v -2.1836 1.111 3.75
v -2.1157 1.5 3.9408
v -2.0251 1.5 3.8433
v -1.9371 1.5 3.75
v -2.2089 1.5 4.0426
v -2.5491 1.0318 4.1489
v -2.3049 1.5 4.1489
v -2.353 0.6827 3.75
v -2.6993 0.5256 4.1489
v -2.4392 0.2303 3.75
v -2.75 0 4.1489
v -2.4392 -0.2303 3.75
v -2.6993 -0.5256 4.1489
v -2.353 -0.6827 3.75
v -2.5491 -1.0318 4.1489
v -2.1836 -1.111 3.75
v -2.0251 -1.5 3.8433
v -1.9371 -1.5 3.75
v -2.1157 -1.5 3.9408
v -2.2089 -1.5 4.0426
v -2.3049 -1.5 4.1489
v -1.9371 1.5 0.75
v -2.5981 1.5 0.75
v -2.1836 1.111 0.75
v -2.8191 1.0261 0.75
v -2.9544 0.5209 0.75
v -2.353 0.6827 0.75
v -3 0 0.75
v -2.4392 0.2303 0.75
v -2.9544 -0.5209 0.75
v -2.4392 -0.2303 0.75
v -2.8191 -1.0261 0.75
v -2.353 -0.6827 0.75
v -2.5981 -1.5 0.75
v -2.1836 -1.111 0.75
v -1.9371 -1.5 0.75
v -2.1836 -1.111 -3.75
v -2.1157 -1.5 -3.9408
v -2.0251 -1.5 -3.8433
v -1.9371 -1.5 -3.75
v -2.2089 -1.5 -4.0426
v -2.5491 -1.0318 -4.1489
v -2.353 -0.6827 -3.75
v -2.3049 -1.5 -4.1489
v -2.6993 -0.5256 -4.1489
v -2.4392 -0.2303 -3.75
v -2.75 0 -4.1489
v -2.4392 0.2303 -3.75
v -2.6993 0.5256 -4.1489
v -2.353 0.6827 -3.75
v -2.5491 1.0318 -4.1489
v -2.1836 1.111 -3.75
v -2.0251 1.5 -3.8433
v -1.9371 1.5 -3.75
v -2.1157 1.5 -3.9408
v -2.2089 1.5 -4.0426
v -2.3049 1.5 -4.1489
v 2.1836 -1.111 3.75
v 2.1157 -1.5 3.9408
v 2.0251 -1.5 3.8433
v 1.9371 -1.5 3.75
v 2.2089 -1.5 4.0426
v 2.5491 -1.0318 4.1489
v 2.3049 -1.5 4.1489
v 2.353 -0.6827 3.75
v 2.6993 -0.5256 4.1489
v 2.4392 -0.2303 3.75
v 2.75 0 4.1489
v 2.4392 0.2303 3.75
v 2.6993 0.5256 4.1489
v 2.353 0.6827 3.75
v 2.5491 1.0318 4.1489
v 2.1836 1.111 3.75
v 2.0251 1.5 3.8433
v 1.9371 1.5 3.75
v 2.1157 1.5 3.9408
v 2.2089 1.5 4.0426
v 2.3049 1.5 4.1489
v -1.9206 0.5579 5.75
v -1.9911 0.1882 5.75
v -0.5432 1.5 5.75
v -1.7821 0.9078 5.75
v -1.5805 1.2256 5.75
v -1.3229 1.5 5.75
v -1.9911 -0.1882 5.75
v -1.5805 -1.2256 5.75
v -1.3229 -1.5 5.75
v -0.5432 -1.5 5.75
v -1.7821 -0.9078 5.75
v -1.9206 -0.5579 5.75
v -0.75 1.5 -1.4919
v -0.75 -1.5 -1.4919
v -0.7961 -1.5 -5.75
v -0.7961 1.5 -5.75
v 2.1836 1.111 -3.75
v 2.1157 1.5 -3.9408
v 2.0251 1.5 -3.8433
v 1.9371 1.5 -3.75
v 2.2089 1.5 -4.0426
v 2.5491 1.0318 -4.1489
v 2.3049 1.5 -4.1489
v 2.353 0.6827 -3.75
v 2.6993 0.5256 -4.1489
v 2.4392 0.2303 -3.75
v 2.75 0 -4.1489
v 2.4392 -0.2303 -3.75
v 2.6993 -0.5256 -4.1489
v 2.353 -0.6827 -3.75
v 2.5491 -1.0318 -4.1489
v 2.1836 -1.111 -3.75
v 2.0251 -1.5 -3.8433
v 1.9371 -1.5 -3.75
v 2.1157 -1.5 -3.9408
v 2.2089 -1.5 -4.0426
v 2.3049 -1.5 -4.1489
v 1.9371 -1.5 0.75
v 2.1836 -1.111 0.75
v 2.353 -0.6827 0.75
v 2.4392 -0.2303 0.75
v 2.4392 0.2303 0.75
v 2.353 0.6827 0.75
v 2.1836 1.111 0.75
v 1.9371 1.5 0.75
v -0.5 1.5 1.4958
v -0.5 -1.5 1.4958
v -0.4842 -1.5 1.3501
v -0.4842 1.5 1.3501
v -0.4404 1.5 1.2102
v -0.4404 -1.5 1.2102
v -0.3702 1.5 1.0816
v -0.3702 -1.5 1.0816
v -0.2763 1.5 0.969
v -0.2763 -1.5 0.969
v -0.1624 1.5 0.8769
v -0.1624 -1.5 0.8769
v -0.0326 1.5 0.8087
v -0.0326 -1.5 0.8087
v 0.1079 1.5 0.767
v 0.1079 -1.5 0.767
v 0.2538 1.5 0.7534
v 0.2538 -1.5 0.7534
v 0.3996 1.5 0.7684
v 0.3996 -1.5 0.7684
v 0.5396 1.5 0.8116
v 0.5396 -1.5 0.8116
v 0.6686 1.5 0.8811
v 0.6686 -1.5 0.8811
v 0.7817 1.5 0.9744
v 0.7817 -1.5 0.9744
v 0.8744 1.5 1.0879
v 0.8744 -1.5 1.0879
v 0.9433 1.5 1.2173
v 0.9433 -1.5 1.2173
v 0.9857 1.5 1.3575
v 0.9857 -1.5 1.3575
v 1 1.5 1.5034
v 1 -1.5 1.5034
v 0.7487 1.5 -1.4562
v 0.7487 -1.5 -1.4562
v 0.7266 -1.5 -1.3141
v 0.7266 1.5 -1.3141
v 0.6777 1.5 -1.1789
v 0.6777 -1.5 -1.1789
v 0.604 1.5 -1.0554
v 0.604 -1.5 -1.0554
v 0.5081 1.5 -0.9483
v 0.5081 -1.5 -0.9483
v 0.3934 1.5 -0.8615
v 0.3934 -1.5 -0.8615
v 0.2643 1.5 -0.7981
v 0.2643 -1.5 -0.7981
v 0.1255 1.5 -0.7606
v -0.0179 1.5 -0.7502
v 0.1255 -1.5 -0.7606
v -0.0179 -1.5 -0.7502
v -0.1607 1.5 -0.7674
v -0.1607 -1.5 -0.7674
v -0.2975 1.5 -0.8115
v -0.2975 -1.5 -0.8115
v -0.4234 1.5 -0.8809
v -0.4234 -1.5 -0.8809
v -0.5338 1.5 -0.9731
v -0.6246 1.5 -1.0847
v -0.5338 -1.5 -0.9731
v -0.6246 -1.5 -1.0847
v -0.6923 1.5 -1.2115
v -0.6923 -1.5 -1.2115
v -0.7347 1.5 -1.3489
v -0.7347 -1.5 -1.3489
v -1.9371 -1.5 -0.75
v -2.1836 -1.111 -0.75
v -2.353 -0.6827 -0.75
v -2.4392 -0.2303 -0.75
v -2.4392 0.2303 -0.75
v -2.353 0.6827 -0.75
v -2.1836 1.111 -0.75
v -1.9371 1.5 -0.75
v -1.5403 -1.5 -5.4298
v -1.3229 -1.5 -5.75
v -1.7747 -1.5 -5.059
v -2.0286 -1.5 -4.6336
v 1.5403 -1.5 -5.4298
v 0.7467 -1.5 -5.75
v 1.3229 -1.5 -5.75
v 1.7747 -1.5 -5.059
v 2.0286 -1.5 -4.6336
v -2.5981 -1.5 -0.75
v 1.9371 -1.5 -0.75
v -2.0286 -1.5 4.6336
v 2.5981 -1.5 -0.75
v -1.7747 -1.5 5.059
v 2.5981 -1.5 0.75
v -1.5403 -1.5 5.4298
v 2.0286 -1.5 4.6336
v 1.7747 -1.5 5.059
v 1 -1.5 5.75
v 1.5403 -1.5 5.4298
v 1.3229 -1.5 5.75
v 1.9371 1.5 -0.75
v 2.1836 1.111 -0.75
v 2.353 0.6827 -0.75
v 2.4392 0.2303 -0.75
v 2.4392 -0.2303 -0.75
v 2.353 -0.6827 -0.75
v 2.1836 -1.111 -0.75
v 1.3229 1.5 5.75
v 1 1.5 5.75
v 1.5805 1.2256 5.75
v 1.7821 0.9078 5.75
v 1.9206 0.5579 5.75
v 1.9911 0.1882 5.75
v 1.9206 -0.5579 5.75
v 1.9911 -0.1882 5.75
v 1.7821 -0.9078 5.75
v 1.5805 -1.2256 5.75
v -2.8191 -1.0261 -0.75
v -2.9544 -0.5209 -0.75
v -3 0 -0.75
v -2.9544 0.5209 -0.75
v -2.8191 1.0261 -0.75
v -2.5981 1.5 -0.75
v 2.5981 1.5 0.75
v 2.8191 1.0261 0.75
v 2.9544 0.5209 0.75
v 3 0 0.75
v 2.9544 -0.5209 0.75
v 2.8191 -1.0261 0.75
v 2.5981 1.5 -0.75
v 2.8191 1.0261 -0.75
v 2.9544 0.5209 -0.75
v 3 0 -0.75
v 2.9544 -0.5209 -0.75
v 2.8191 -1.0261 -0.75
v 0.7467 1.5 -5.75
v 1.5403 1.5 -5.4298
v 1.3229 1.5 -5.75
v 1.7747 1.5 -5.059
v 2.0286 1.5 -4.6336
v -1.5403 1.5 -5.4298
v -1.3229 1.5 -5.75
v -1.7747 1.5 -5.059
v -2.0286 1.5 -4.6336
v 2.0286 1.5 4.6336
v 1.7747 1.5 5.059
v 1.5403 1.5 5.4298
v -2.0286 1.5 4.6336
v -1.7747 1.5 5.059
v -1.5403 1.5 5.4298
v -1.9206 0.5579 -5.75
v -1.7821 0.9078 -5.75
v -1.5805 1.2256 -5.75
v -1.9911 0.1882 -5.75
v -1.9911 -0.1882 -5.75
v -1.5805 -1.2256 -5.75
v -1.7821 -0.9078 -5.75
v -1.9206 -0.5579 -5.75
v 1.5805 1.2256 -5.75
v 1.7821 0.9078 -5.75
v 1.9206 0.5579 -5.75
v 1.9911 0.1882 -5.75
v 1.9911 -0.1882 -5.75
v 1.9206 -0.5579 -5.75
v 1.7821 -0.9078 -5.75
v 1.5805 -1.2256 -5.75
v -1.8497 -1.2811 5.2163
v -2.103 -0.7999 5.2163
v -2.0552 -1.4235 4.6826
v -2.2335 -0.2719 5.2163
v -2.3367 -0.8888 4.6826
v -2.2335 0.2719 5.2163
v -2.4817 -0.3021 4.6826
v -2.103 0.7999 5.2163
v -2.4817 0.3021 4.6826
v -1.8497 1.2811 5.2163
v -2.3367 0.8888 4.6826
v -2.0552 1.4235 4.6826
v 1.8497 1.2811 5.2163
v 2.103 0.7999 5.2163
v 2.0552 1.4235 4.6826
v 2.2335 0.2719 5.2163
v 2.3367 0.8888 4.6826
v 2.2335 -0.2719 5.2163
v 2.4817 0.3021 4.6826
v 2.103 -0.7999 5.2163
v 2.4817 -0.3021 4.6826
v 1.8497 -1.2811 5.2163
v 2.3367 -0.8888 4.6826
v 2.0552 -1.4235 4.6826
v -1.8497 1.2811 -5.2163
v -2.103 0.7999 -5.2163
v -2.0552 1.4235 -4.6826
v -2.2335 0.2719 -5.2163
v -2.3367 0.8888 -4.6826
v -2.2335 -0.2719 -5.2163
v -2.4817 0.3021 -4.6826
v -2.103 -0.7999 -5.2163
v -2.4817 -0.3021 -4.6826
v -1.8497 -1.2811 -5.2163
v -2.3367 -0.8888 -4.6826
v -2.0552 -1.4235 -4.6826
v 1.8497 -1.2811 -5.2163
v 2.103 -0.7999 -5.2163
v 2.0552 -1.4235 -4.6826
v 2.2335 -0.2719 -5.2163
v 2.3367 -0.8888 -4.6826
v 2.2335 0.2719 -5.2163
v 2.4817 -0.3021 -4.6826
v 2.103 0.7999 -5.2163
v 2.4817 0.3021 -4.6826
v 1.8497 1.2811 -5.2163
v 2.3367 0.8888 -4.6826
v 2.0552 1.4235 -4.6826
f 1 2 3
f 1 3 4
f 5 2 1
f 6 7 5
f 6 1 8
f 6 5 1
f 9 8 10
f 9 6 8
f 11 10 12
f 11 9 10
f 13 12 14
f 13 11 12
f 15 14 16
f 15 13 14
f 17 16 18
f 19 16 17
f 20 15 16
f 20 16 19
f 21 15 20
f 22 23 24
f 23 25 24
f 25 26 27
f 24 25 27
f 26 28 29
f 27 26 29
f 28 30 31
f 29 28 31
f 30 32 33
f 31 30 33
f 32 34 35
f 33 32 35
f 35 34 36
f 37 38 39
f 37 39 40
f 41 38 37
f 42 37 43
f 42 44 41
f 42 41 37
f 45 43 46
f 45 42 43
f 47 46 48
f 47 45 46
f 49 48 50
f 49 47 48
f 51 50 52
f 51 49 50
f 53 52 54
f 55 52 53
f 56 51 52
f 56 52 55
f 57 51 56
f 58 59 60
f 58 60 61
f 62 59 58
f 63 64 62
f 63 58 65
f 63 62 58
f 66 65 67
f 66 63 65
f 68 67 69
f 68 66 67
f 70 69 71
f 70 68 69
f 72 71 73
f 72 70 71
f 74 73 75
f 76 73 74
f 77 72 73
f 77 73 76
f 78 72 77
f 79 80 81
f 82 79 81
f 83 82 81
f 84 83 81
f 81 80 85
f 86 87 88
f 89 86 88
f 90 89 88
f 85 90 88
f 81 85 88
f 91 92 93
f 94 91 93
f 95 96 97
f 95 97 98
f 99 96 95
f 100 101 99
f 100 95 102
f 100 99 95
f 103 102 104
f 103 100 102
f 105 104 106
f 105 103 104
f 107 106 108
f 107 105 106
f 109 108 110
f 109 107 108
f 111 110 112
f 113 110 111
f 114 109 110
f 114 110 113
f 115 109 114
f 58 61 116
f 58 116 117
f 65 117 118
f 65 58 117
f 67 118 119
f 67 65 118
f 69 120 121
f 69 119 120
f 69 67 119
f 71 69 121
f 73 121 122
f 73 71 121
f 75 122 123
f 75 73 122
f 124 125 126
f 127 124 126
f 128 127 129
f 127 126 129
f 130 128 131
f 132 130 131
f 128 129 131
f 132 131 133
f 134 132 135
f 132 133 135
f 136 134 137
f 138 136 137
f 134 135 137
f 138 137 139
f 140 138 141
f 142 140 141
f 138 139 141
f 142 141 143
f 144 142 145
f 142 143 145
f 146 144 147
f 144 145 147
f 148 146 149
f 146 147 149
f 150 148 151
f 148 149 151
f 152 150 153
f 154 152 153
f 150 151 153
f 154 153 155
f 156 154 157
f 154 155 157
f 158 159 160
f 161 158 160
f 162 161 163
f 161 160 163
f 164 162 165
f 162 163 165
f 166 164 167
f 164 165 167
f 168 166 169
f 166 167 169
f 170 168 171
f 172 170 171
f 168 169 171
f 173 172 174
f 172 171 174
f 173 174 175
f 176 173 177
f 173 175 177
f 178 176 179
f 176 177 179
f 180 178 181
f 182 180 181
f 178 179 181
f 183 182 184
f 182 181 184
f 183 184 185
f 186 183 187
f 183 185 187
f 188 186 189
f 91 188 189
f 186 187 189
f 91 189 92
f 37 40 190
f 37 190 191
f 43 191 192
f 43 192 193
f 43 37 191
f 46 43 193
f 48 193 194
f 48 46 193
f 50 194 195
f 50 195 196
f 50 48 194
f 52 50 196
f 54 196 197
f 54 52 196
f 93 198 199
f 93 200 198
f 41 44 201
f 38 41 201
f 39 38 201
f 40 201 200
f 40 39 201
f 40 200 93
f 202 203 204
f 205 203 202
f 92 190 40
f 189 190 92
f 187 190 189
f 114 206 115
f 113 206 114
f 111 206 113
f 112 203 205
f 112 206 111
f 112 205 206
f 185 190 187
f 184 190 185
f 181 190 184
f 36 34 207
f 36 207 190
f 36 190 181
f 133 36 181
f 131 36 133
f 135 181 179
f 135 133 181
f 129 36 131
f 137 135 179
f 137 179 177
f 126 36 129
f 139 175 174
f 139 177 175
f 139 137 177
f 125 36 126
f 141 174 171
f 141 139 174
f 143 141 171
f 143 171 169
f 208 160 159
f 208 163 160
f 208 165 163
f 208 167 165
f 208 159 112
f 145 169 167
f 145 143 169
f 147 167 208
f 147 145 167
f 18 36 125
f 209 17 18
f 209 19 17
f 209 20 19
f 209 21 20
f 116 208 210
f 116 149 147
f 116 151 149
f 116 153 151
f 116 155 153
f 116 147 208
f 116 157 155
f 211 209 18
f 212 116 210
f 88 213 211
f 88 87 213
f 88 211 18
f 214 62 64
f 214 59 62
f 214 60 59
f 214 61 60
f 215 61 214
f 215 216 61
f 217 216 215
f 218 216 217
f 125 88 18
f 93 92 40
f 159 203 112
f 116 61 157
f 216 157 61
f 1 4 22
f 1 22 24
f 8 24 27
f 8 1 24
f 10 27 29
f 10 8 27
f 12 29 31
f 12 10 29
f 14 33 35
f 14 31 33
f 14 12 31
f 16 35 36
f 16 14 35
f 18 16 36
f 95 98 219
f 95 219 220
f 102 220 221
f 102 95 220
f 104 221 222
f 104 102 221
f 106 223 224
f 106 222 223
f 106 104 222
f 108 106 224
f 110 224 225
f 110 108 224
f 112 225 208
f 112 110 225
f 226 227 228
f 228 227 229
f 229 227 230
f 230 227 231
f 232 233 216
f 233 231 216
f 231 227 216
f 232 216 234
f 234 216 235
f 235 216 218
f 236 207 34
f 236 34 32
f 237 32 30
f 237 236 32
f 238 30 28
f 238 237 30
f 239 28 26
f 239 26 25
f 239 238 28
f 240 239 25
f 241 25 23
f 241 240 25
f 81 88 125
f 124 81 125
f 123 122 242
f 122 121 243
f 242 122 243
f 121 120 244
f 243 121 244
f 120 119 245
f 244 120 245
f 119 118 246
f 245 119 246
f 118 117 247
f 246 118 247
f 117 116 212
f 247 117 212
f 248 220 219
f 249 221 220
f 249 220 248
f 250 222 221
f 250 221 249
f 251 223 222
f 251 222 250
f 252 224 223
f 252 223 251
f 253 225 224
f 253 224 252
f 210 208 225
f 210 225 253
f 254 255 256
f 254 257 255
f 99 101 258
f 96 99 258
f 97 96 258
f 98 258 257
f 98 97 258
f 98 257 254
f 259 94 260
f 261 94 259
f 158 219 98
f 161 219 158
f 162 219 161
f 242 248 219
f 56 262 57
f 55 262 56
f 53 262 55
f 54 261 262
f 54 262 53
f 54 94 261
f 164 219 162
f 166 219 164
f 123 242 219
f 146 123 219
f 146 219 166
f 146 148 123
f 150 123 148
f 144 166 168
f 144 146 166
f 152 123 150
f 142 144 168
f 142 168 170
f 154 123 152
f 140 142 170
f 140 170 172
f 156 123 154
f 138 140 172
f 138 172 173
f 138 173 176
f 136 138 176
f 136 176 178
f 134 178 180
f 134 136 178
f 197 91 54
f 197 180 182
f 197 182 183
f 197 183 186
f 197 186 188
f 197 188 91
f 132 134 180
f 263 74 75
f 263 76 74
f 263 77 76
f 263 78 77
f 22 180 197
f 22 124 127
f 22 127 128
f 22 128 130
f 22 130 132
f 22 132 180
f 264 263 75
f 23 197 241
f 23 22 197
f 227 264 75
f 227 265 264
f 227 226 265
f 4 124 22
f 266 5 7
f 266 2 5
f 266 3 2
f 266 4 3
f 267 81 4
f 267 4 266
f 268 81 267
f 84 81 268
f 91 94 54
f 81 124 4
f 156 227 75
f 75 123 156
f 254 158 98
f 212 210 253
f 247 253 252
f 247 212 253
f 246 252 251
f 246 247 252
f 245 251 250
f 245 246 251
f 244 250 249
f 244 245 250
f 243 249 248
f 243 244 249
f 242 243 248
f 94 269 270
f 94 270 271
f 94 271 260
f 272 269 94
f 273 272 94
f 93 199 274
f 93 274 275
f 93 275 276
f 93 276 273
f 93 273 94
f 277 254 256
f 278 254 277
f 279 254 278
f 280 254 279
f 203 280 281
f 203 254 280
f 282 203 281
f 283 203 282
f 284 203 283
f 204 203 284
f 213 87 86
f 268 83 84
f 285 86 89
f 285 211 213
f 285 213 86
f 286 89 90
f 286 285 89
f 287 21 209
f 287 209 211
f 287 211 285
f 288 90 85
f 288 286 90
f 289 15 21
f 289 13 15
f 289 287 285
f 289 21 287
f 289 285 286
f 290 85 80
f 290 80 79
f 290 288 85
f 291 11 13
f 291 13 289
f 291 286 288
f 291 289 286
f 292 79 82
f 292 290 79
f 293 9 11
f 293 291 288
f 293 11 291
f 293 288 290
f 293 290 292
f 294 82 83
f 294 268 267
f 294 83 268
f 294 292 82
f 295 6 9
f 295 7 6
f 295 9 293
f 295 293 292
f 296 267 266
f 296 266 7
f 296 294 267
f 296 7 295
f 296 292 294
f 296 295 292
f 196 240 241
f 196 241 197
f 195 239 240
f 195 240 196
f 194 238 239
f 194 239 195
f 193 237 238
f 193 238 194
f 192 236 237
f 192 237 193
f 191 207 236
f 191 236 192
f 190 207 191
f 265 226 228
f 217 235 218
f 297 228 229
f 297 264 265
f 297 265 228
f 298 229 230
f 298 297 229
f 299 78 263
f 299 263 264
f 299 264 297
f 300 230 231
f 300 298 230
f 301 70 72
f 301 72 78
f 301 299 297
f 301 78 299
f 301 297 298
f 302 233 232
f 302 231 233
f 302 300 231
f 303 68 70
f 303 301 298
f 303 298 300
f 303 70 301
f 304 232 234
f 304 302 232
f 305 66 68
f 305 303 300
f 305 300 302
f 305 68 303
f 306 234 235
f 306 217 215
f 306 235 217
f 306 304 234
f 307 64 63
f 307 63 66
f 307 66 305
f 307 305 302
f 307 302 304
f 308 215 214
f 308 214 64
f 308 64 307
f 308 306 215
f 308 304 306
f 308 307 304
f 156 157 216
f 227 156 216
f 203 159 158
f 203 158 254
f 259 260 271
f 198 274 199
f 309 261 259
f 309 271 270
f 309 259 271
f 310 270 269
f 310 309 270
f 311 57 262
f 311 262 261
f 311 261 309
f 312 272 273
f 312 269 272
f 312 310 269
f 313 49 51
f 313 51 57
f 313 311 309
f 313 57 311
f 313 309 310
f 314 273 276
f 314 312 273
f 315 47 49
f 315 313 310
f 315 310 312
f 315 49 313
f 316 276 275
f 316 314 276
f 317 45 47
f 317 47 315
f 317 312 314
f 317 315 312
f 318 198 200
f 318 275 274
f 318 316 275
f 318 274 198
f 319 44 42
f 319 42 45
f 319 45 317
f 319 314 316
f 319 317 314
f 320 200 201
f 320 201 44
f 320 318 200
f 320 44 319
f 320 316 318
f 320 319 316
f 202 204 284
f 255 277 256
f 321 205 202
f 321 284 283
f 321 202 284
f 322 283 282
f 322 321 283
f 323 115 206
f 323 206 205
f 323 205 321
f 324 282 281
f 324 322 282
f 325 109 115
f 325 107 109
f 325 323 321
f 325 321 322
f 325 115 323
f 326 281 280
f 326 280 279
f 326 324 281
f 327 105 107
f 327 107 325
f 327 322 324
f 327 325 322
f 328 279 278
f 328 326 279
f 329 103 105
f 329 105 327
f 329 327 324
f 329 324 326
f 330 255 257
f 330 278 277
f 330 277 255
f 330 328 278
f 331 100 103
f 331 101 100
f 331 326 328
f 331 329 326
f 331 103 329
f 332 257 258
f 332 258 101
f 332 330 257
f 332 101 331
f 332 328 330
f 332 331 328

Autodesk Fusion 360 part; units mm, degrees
sketch "Sketch1" plane through (0, 0, 0) normal (0, 1, 0) x (1, 0, 0)
  line L0 (3, 0) -> (3, -0.75)
  line L1 (3, -0.75) -> (2.45, -0.75)
  line L2 (2.45, -0.75) -> (2.45, -3.75)
  line L3 (2.45, -3.75) -> (2.75, -4.1489)
  line L4 (2.75, -4.1489) -> (2, -5.75)
  line L5 (2, -5.75) -> (0, -5.75)
  line L6 (3, 0) -> (0, 0) construction
  line L7 (2.75, 4.1489) -> (2, 5.75)
  line L8 (3, 0) -> (3, 0.75)
  line L9 (2.45, 0.75) -> (2.45, 3.75)
  line L10 (2.45, 3.75) -> (2.75, 4.1489)
  line L11 (2, 5.75) -> (0, 5.75)
  line L12 (0, 0) -> (0, 6.5) construction
  line L13 (3, 0.75) -> (2.45, 0.75)
  line L14 (0, -5.75) -> (0, 5.75)
  dimension "d1" = 3
  dimension "d2" = 0.75
  dimension "d3" = 3
  dimension "d4" = 5
  dimension "d6" = 2
  dimension "d7" = 2.75
  dimension "d8" = 2.45
  dimension "d9" = 2
revolve "Revolve2" add sketch "Sketch1" angle 360 about axis through (0, 0, 5.75) along (0, 0, -1)
sketch "Sketch3" plane through (0, 0, 5.75) normal (0, 0, 1) x (-1, 0, 0)
  circle A0 centre (0, 0) radius 2
  line L0 (-5, -1.5) -> (5, -1.5)
  line L1 (5, -1.5) -> (5, 1.5)
  line L2 (5, 1.5) -> (-5, 1.5)
  line L3 (-5, 1.5) -> (-5, -1.5)
  line L4 (-5, -1.5) -> (5, 1.5) construction
  line L5 (5, -1.5) -> (-5, 1.5) construction
  line L6 (5.6117, 3.0022) -> (-6, 3.0022)
  line L7 (-6, 3.0022) -> (-6, -3)
  line L8 (-6, -3) -> (5.6117, -3)
  line L9 (5.6117, -3) -> (5.6117, 3.0022)
  circle A1 centre (0, 0) radius 2
  dimension "d12" = 10
  dimension "d13" = 3
extrude "Extrude3" cut sketch "Sketch3" against normal blind 14 contours A0 L2 A1 | A0 L0 A1 | L6 L7 L8 L9
sketch "Sketch4" plane through (0, -1.5, 0) normal (0, -1, 0) x (1, 0, 0)
  spline S0 degree 2 poles (-2.3049, 4.1489) (-1.7364, 5.1662) (-1.3229, 5.75) knots 0 0 0 0.187886 0.187886 0.187886 weights 1 1.022081 1
  spline S1 degree 2 poles (-1.9371, 3.75) (-2.1104, 3.9322) (-2.3049, 4.1489) knots 0 0 0 0.054258 0.054258 0.054258 weights 1 1.00251 1
  line L0 (-1.9371, 3.75) -> (-1.9371, 0.75)
  line L1 (-1.9371, 0.75) -> (-2.5981, 0.75)
  line L2 (-2.5981, 0.75) -> (-2.5981, -0.75)
  line L3 (-2.5981, -0.75) -> (-1.9371, -0.75)
  line L4 (-1.9371, -0.75) -> (-1.9371, -3.75)
  spline S2 degree 2 poles (-2.3049, -4.1489) (-2.1104, -3.9322) (-1.9371, -3.75) knots 0 0 0 0.054258 0.054258 0.054258 weights 1 1.00251 1
  spline S3 degree 2 poles (-1.3229, -5.75) (-1.7364, -5.1662) (-2.3049, -4.1489) knots 0 0 0 0.187886 0.187886 0.187886 weights 1 1.022081 1
  line L5 (-1.3229, -5.75) -> (1.3229, -5.75)
  spline S4 degree 2 poles (2.3049, -4.1489) (1.7364, -5.1662) (1.3229, -5.75) knots 0 0 0 0.187886 0.187886 0.187886 weights 1 1.022081 1
  spline S5 degree 2 poles (1.9371, -3.75) (2.1104, -3.9322) (2.3049, -4.1489) knots 0 0 0 0.054258 0.054258 0.054258 weights 1 1.00251 1
  line L6 (1.9371, -3.75) -> (1.9371, -0.75)
  line L7 (1.9371, -0.75) -> (2.5981, -0.75)
  line L8 (2.5981, -0.75) -> (2.5981, 0.75)
  line L9 (2.5981, 0.75) -> (1.9371, 0.75)
  line L10 (1.9371, 0.75) -> (1.9371, 3.75)
  spline S6 degree 2 poles (2.3049, 4.1489) (2.1104, 3.9322) (1.9371, 3.75) knots 0 0 0 0.054258 0.054258 0.054258 weights 1 1.00251 1
  spline S7 degree 2 poles (1.3229, 5.75) (1.7364, 5.1662) (2.3049, 4.1489) knots 0 0 0 0.187886 0.187886 0.187886 weights 1 1.022081 1
  line L11 (1.3229, 5.75) -> (-1.3229, 5.75)
  circle A0 centre (0, 0) radius 1.5 construction
  line L12 (-0.5432, 5.75) -> (-0.5, 1.4958)
  line L13 (2, 5.75) -> (0, 5.75)
  line L14 (1, 5.75) -> (1, 1.5034)
  line L15 (2, -5.75) -> (0, -5.75)
  line L16 (-0.75, -1.4919) -> (-0.7961, -5.75)
  arc A1 (0.7487, -1.4562) -> (-0.75, -1.4919) centre (0, -1.5) ccw
  line L17 (-0.7961, -5.75) -> (-0.7961, -6.4979)
  line L18 (-0.7961, -6.4979) -> (0.7464, -6.5067)
  line L19 (-0.5432, 5.75) -> (-0.5402, 6.4921)
  line L20 (-0.5402, 6.4921) -> (1, 6.5078)
  line L21 (1, 5.75) -> (1, 6.5078)
  arc A2 (-0.5, 1.4958) -> (1, 1.5034) centre (0.25, 1.5034) ccw
  spline S8 degree 2 poles (-2.3049, 4.1489) (-1.7364, 5.1662) (-1.3229, 5.75) knots 0 0 0 0.187886 0.187886 0.187886 weights 1 1.022081 1
  spline S9 degree 2 poles (-1.9371, 3.75) (-2.1104, 3.9322) (-2.3049, 4.1489) knots 0 0 0 0.054258 0.054258 0.054258 weights 1 1.00251 1
  line L22 (-1.9371, 3.75) -> (-1.9371, 0.75)
  line L23 (-1.9371, 0.75) -> (-2.5981, 0.75)
  line L24 (-2.5981, 0.75) -> (-2.5981, -0.75)
  line L25 (-2.5981, -0.75) -> (-1.9371, -0.75)
  line L26 (-1.9371, -0.75) -> (-1.9371, -3.75)
  spline S10 degree 2 poles (-2.3049, -4.1489) (-2.1104, -3.9322) (-1.9371, -3.75) knots 0 0 0 0.054258 0.054258 0.054258 weights 1 1.00251 1
  spline S11 degree 2 poles (-1.3229, -5.75) (-1.7364, -5.1662) (-2.3049, -4.1489) knots 0 0 0 0.187886 0.187886 0.187886 weights 1 1.022081 1
  line L27 (-1.3229, -5.75) -> (1.3229, -5.75)
  spline S12 degree 2 poles (2.3049, -4.1489) (1.7364, -5.1662) (1.3229, -5.75) knots 0 0 0 0.187886 0.187886 0.187886 weights 1 1.022081 1
  spline S13 degree 2 poles (1.9371, -3.75) (2.1104, -3.9322) (2.3049, -4.1489) knots 0 0 0 0.054258 0.054258 0.054258 weights 1 1.00251 1
  line L28 (1.9371, -3.75) -> (1.9371, -0.75)
  line L29 (1.9371, -0.75) -> (2.5981, -0.75)
  line L30 (2.5981, -0.75) -> (2.5981, 0.75)
  line L31 (2.5981, 0.75) -> (1.9371, 0.75)
  line L32 (1.9371, 0.75) -> (1.9371, 3.75)
  spline S14 degree 2 poles (2.3049, 4.1489) (2.1104, 3.9322) (1.9371, 3.75) knots 0 0 0 0.054258 0.054258 0.054258 weights 1 1.00251 1
  spline S15 degree 2 poles (1.3229, 5.75) (1.7364, 5.1662) (2.3049, 4.1489) knots 0 0 0 0.187886 0.187886 0.187886 weights 1 1.022081 1
  line L33 (1.3229, 5.75) -> (-1.3229, 5.75)
  line L34 (0.7487, -1.4562) -> (0.7464, -6.5067)
  dimension "d16" = 3
  dimension "d17" = 1.5
  dimension "d18" = 1.5
extrude "Extrude4" cut sketch "Sketch4" against normal blind 6 contours L11 L13 L19 L20 L21 L33 | L11 L12 L13 L14 A2 L33 | L5 L15 L16 A1 L27 L34 | L5 L15 L17 L18 L27 L34
equation "d2 = 0.8 mm - 0.05 mm"
